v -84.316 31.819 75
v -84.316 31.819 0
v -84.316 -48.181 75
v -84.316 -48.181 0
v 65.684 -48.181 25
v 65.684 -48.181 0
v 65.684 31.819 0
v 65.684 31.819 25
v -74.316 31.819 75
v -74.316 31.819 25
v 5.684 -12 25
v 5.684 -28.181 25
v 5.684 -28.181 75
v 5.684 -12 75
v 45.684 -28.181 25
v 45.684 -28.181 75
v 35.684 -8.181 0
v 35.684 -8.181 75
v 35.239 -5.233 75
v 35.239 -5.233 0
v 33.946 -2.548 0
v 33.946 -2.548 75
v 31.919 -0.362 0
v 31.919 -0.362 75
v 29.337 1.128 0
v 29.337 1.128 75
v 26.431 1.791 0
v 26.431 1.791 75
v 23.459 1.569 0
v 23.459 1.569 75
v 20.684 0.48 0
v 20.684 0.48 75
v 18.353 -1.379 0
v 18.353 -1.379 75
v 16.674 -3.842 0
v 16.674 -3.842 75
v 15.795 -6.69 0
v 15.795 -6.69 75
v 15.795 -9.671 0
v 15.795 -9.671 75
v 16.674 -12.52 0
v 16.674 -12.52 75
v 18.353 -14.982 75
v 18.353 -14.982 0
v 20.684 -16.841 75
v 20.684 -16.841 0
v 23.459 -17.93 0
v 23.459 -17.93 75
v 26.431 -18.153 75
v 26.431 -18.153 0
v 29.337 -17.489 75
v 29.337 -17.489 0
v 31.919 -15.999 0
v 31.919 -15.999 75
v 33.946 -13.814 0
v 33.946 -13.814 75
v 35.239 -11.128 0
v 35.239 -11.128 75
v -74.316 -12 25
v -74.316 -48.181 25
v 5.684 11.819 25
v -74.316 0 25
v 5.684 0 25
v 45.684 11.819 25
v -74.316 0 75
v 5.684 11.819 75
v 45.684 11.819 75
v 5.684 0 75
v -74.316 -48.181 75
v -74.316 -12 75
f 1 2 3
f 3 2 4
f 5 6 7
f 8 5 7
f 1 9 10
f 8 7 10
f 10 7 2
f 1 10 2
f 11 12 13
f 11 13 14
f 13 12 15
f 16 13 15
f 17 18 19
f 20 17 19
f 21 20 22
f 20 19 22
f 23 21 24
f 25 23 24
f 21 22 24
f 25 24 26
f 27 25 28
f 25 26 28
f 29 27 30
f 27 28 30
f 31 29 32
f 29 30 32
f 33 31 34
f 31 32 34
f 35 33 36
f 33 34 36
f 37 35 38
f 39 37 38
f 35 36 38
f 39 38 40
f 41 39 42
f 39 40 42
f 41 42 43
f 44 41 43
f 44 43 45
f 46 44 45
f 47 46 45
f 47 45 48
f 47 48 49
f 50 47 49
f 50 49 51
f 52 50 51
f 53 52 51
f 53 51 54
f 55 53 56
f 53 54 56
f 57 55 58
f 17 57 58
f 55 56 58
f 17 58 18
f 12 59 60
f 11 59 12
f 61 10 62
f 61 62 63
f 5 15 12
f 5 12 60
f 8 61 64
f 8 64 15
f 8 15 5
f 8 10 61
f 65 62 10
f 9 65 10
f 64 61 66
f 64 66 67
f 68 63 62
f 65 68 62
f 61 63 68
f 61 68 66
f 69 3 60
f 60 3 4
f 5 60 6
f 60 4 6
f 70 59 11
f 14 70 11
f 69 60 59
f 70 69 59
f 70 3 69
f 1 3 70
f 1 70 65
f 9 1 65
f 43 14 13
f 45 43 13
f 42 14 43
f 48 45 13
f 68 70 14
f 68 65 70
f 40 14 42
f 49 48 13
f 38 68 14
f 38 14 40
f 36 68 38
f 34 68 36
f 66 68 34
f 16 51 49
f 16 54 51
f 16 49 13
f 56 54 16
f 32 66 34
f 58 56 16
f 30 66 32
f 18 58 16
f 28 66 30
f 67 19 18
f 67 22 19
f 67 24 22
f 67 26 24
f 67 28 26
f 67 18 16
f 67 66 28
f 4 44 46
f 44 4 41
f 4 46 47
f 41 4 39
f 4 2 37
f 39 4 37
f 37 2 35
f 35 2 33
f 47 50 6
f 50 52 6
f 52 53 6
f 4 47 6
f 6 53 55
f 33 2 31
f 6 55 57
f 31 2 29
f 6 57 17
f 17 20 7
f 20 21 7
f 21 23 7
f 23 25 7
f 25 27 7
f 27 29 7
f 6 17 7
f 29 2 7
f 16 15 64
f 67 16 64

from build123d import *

# Parameters (mm, degrees)
F0_W     = 150
F0_H     = 80
F1_DEPTH = 25
F2_W     = 40
F2_H     = 40
F3_DEPTH = 50
F4_R     = 10
F5_DEPTH = 75
F7_DEPTH = 50
F9_DEPTH = 50


with BuildPart() as f1:
    # F0 (on Top) → F1 (new body)
    with BuildSketch(Plane.XY):
        with Locations((-9.3162462115, -8.1807105243)):
            Rectangle(F0_W, F0_H)
    extrude(amount=F1_DEPTH)

    # F2 (on face) → F3 (join)
    with BuildSketch(Plane.XY.offset(25)):
        with Locations((25.6837537885, -8.1807105243)):
            Rectangle(F2_W, F2_H)
    extrude(amount=F3_DEPTH)

    # F4 (on face) → F5 (cut)
    with BuildSketch(Plane.XY.offset(75)):
        with Locations((25.6837537885, -8.1807105243)):
            Circle(F4_R)
    extrude(amount=-F5_DEPTH, mode=Mode.SUBTRACT)

    # F6 (on face) → F7 (join)
    with BuildSketch(Plane.XY.offset(25)):
        Polygon((5.6837537885, 0), (-74.3162462115, 0), (-74.3162462115, -12), (5.6837537885, -12), (5.6837537885, -8.1807105243), align=None)
    extrude(amount=F7_DEPTH)

    # F8 (on face) → F9 (join)
    with BuildSketch(Plane.XY.offset(25)):
        Polygon((-84.3162462115, 31.8192894757), (-84.3162462115, -48.1807105243), (-74.3162462115, -48.1807105243), (-74.3162462115, -12), (-74.3162462115, 0), (-74.3162462115, 31.8192894757), align=None)
    extrude(amount=F9_DEPTH)


solid = f1.part
